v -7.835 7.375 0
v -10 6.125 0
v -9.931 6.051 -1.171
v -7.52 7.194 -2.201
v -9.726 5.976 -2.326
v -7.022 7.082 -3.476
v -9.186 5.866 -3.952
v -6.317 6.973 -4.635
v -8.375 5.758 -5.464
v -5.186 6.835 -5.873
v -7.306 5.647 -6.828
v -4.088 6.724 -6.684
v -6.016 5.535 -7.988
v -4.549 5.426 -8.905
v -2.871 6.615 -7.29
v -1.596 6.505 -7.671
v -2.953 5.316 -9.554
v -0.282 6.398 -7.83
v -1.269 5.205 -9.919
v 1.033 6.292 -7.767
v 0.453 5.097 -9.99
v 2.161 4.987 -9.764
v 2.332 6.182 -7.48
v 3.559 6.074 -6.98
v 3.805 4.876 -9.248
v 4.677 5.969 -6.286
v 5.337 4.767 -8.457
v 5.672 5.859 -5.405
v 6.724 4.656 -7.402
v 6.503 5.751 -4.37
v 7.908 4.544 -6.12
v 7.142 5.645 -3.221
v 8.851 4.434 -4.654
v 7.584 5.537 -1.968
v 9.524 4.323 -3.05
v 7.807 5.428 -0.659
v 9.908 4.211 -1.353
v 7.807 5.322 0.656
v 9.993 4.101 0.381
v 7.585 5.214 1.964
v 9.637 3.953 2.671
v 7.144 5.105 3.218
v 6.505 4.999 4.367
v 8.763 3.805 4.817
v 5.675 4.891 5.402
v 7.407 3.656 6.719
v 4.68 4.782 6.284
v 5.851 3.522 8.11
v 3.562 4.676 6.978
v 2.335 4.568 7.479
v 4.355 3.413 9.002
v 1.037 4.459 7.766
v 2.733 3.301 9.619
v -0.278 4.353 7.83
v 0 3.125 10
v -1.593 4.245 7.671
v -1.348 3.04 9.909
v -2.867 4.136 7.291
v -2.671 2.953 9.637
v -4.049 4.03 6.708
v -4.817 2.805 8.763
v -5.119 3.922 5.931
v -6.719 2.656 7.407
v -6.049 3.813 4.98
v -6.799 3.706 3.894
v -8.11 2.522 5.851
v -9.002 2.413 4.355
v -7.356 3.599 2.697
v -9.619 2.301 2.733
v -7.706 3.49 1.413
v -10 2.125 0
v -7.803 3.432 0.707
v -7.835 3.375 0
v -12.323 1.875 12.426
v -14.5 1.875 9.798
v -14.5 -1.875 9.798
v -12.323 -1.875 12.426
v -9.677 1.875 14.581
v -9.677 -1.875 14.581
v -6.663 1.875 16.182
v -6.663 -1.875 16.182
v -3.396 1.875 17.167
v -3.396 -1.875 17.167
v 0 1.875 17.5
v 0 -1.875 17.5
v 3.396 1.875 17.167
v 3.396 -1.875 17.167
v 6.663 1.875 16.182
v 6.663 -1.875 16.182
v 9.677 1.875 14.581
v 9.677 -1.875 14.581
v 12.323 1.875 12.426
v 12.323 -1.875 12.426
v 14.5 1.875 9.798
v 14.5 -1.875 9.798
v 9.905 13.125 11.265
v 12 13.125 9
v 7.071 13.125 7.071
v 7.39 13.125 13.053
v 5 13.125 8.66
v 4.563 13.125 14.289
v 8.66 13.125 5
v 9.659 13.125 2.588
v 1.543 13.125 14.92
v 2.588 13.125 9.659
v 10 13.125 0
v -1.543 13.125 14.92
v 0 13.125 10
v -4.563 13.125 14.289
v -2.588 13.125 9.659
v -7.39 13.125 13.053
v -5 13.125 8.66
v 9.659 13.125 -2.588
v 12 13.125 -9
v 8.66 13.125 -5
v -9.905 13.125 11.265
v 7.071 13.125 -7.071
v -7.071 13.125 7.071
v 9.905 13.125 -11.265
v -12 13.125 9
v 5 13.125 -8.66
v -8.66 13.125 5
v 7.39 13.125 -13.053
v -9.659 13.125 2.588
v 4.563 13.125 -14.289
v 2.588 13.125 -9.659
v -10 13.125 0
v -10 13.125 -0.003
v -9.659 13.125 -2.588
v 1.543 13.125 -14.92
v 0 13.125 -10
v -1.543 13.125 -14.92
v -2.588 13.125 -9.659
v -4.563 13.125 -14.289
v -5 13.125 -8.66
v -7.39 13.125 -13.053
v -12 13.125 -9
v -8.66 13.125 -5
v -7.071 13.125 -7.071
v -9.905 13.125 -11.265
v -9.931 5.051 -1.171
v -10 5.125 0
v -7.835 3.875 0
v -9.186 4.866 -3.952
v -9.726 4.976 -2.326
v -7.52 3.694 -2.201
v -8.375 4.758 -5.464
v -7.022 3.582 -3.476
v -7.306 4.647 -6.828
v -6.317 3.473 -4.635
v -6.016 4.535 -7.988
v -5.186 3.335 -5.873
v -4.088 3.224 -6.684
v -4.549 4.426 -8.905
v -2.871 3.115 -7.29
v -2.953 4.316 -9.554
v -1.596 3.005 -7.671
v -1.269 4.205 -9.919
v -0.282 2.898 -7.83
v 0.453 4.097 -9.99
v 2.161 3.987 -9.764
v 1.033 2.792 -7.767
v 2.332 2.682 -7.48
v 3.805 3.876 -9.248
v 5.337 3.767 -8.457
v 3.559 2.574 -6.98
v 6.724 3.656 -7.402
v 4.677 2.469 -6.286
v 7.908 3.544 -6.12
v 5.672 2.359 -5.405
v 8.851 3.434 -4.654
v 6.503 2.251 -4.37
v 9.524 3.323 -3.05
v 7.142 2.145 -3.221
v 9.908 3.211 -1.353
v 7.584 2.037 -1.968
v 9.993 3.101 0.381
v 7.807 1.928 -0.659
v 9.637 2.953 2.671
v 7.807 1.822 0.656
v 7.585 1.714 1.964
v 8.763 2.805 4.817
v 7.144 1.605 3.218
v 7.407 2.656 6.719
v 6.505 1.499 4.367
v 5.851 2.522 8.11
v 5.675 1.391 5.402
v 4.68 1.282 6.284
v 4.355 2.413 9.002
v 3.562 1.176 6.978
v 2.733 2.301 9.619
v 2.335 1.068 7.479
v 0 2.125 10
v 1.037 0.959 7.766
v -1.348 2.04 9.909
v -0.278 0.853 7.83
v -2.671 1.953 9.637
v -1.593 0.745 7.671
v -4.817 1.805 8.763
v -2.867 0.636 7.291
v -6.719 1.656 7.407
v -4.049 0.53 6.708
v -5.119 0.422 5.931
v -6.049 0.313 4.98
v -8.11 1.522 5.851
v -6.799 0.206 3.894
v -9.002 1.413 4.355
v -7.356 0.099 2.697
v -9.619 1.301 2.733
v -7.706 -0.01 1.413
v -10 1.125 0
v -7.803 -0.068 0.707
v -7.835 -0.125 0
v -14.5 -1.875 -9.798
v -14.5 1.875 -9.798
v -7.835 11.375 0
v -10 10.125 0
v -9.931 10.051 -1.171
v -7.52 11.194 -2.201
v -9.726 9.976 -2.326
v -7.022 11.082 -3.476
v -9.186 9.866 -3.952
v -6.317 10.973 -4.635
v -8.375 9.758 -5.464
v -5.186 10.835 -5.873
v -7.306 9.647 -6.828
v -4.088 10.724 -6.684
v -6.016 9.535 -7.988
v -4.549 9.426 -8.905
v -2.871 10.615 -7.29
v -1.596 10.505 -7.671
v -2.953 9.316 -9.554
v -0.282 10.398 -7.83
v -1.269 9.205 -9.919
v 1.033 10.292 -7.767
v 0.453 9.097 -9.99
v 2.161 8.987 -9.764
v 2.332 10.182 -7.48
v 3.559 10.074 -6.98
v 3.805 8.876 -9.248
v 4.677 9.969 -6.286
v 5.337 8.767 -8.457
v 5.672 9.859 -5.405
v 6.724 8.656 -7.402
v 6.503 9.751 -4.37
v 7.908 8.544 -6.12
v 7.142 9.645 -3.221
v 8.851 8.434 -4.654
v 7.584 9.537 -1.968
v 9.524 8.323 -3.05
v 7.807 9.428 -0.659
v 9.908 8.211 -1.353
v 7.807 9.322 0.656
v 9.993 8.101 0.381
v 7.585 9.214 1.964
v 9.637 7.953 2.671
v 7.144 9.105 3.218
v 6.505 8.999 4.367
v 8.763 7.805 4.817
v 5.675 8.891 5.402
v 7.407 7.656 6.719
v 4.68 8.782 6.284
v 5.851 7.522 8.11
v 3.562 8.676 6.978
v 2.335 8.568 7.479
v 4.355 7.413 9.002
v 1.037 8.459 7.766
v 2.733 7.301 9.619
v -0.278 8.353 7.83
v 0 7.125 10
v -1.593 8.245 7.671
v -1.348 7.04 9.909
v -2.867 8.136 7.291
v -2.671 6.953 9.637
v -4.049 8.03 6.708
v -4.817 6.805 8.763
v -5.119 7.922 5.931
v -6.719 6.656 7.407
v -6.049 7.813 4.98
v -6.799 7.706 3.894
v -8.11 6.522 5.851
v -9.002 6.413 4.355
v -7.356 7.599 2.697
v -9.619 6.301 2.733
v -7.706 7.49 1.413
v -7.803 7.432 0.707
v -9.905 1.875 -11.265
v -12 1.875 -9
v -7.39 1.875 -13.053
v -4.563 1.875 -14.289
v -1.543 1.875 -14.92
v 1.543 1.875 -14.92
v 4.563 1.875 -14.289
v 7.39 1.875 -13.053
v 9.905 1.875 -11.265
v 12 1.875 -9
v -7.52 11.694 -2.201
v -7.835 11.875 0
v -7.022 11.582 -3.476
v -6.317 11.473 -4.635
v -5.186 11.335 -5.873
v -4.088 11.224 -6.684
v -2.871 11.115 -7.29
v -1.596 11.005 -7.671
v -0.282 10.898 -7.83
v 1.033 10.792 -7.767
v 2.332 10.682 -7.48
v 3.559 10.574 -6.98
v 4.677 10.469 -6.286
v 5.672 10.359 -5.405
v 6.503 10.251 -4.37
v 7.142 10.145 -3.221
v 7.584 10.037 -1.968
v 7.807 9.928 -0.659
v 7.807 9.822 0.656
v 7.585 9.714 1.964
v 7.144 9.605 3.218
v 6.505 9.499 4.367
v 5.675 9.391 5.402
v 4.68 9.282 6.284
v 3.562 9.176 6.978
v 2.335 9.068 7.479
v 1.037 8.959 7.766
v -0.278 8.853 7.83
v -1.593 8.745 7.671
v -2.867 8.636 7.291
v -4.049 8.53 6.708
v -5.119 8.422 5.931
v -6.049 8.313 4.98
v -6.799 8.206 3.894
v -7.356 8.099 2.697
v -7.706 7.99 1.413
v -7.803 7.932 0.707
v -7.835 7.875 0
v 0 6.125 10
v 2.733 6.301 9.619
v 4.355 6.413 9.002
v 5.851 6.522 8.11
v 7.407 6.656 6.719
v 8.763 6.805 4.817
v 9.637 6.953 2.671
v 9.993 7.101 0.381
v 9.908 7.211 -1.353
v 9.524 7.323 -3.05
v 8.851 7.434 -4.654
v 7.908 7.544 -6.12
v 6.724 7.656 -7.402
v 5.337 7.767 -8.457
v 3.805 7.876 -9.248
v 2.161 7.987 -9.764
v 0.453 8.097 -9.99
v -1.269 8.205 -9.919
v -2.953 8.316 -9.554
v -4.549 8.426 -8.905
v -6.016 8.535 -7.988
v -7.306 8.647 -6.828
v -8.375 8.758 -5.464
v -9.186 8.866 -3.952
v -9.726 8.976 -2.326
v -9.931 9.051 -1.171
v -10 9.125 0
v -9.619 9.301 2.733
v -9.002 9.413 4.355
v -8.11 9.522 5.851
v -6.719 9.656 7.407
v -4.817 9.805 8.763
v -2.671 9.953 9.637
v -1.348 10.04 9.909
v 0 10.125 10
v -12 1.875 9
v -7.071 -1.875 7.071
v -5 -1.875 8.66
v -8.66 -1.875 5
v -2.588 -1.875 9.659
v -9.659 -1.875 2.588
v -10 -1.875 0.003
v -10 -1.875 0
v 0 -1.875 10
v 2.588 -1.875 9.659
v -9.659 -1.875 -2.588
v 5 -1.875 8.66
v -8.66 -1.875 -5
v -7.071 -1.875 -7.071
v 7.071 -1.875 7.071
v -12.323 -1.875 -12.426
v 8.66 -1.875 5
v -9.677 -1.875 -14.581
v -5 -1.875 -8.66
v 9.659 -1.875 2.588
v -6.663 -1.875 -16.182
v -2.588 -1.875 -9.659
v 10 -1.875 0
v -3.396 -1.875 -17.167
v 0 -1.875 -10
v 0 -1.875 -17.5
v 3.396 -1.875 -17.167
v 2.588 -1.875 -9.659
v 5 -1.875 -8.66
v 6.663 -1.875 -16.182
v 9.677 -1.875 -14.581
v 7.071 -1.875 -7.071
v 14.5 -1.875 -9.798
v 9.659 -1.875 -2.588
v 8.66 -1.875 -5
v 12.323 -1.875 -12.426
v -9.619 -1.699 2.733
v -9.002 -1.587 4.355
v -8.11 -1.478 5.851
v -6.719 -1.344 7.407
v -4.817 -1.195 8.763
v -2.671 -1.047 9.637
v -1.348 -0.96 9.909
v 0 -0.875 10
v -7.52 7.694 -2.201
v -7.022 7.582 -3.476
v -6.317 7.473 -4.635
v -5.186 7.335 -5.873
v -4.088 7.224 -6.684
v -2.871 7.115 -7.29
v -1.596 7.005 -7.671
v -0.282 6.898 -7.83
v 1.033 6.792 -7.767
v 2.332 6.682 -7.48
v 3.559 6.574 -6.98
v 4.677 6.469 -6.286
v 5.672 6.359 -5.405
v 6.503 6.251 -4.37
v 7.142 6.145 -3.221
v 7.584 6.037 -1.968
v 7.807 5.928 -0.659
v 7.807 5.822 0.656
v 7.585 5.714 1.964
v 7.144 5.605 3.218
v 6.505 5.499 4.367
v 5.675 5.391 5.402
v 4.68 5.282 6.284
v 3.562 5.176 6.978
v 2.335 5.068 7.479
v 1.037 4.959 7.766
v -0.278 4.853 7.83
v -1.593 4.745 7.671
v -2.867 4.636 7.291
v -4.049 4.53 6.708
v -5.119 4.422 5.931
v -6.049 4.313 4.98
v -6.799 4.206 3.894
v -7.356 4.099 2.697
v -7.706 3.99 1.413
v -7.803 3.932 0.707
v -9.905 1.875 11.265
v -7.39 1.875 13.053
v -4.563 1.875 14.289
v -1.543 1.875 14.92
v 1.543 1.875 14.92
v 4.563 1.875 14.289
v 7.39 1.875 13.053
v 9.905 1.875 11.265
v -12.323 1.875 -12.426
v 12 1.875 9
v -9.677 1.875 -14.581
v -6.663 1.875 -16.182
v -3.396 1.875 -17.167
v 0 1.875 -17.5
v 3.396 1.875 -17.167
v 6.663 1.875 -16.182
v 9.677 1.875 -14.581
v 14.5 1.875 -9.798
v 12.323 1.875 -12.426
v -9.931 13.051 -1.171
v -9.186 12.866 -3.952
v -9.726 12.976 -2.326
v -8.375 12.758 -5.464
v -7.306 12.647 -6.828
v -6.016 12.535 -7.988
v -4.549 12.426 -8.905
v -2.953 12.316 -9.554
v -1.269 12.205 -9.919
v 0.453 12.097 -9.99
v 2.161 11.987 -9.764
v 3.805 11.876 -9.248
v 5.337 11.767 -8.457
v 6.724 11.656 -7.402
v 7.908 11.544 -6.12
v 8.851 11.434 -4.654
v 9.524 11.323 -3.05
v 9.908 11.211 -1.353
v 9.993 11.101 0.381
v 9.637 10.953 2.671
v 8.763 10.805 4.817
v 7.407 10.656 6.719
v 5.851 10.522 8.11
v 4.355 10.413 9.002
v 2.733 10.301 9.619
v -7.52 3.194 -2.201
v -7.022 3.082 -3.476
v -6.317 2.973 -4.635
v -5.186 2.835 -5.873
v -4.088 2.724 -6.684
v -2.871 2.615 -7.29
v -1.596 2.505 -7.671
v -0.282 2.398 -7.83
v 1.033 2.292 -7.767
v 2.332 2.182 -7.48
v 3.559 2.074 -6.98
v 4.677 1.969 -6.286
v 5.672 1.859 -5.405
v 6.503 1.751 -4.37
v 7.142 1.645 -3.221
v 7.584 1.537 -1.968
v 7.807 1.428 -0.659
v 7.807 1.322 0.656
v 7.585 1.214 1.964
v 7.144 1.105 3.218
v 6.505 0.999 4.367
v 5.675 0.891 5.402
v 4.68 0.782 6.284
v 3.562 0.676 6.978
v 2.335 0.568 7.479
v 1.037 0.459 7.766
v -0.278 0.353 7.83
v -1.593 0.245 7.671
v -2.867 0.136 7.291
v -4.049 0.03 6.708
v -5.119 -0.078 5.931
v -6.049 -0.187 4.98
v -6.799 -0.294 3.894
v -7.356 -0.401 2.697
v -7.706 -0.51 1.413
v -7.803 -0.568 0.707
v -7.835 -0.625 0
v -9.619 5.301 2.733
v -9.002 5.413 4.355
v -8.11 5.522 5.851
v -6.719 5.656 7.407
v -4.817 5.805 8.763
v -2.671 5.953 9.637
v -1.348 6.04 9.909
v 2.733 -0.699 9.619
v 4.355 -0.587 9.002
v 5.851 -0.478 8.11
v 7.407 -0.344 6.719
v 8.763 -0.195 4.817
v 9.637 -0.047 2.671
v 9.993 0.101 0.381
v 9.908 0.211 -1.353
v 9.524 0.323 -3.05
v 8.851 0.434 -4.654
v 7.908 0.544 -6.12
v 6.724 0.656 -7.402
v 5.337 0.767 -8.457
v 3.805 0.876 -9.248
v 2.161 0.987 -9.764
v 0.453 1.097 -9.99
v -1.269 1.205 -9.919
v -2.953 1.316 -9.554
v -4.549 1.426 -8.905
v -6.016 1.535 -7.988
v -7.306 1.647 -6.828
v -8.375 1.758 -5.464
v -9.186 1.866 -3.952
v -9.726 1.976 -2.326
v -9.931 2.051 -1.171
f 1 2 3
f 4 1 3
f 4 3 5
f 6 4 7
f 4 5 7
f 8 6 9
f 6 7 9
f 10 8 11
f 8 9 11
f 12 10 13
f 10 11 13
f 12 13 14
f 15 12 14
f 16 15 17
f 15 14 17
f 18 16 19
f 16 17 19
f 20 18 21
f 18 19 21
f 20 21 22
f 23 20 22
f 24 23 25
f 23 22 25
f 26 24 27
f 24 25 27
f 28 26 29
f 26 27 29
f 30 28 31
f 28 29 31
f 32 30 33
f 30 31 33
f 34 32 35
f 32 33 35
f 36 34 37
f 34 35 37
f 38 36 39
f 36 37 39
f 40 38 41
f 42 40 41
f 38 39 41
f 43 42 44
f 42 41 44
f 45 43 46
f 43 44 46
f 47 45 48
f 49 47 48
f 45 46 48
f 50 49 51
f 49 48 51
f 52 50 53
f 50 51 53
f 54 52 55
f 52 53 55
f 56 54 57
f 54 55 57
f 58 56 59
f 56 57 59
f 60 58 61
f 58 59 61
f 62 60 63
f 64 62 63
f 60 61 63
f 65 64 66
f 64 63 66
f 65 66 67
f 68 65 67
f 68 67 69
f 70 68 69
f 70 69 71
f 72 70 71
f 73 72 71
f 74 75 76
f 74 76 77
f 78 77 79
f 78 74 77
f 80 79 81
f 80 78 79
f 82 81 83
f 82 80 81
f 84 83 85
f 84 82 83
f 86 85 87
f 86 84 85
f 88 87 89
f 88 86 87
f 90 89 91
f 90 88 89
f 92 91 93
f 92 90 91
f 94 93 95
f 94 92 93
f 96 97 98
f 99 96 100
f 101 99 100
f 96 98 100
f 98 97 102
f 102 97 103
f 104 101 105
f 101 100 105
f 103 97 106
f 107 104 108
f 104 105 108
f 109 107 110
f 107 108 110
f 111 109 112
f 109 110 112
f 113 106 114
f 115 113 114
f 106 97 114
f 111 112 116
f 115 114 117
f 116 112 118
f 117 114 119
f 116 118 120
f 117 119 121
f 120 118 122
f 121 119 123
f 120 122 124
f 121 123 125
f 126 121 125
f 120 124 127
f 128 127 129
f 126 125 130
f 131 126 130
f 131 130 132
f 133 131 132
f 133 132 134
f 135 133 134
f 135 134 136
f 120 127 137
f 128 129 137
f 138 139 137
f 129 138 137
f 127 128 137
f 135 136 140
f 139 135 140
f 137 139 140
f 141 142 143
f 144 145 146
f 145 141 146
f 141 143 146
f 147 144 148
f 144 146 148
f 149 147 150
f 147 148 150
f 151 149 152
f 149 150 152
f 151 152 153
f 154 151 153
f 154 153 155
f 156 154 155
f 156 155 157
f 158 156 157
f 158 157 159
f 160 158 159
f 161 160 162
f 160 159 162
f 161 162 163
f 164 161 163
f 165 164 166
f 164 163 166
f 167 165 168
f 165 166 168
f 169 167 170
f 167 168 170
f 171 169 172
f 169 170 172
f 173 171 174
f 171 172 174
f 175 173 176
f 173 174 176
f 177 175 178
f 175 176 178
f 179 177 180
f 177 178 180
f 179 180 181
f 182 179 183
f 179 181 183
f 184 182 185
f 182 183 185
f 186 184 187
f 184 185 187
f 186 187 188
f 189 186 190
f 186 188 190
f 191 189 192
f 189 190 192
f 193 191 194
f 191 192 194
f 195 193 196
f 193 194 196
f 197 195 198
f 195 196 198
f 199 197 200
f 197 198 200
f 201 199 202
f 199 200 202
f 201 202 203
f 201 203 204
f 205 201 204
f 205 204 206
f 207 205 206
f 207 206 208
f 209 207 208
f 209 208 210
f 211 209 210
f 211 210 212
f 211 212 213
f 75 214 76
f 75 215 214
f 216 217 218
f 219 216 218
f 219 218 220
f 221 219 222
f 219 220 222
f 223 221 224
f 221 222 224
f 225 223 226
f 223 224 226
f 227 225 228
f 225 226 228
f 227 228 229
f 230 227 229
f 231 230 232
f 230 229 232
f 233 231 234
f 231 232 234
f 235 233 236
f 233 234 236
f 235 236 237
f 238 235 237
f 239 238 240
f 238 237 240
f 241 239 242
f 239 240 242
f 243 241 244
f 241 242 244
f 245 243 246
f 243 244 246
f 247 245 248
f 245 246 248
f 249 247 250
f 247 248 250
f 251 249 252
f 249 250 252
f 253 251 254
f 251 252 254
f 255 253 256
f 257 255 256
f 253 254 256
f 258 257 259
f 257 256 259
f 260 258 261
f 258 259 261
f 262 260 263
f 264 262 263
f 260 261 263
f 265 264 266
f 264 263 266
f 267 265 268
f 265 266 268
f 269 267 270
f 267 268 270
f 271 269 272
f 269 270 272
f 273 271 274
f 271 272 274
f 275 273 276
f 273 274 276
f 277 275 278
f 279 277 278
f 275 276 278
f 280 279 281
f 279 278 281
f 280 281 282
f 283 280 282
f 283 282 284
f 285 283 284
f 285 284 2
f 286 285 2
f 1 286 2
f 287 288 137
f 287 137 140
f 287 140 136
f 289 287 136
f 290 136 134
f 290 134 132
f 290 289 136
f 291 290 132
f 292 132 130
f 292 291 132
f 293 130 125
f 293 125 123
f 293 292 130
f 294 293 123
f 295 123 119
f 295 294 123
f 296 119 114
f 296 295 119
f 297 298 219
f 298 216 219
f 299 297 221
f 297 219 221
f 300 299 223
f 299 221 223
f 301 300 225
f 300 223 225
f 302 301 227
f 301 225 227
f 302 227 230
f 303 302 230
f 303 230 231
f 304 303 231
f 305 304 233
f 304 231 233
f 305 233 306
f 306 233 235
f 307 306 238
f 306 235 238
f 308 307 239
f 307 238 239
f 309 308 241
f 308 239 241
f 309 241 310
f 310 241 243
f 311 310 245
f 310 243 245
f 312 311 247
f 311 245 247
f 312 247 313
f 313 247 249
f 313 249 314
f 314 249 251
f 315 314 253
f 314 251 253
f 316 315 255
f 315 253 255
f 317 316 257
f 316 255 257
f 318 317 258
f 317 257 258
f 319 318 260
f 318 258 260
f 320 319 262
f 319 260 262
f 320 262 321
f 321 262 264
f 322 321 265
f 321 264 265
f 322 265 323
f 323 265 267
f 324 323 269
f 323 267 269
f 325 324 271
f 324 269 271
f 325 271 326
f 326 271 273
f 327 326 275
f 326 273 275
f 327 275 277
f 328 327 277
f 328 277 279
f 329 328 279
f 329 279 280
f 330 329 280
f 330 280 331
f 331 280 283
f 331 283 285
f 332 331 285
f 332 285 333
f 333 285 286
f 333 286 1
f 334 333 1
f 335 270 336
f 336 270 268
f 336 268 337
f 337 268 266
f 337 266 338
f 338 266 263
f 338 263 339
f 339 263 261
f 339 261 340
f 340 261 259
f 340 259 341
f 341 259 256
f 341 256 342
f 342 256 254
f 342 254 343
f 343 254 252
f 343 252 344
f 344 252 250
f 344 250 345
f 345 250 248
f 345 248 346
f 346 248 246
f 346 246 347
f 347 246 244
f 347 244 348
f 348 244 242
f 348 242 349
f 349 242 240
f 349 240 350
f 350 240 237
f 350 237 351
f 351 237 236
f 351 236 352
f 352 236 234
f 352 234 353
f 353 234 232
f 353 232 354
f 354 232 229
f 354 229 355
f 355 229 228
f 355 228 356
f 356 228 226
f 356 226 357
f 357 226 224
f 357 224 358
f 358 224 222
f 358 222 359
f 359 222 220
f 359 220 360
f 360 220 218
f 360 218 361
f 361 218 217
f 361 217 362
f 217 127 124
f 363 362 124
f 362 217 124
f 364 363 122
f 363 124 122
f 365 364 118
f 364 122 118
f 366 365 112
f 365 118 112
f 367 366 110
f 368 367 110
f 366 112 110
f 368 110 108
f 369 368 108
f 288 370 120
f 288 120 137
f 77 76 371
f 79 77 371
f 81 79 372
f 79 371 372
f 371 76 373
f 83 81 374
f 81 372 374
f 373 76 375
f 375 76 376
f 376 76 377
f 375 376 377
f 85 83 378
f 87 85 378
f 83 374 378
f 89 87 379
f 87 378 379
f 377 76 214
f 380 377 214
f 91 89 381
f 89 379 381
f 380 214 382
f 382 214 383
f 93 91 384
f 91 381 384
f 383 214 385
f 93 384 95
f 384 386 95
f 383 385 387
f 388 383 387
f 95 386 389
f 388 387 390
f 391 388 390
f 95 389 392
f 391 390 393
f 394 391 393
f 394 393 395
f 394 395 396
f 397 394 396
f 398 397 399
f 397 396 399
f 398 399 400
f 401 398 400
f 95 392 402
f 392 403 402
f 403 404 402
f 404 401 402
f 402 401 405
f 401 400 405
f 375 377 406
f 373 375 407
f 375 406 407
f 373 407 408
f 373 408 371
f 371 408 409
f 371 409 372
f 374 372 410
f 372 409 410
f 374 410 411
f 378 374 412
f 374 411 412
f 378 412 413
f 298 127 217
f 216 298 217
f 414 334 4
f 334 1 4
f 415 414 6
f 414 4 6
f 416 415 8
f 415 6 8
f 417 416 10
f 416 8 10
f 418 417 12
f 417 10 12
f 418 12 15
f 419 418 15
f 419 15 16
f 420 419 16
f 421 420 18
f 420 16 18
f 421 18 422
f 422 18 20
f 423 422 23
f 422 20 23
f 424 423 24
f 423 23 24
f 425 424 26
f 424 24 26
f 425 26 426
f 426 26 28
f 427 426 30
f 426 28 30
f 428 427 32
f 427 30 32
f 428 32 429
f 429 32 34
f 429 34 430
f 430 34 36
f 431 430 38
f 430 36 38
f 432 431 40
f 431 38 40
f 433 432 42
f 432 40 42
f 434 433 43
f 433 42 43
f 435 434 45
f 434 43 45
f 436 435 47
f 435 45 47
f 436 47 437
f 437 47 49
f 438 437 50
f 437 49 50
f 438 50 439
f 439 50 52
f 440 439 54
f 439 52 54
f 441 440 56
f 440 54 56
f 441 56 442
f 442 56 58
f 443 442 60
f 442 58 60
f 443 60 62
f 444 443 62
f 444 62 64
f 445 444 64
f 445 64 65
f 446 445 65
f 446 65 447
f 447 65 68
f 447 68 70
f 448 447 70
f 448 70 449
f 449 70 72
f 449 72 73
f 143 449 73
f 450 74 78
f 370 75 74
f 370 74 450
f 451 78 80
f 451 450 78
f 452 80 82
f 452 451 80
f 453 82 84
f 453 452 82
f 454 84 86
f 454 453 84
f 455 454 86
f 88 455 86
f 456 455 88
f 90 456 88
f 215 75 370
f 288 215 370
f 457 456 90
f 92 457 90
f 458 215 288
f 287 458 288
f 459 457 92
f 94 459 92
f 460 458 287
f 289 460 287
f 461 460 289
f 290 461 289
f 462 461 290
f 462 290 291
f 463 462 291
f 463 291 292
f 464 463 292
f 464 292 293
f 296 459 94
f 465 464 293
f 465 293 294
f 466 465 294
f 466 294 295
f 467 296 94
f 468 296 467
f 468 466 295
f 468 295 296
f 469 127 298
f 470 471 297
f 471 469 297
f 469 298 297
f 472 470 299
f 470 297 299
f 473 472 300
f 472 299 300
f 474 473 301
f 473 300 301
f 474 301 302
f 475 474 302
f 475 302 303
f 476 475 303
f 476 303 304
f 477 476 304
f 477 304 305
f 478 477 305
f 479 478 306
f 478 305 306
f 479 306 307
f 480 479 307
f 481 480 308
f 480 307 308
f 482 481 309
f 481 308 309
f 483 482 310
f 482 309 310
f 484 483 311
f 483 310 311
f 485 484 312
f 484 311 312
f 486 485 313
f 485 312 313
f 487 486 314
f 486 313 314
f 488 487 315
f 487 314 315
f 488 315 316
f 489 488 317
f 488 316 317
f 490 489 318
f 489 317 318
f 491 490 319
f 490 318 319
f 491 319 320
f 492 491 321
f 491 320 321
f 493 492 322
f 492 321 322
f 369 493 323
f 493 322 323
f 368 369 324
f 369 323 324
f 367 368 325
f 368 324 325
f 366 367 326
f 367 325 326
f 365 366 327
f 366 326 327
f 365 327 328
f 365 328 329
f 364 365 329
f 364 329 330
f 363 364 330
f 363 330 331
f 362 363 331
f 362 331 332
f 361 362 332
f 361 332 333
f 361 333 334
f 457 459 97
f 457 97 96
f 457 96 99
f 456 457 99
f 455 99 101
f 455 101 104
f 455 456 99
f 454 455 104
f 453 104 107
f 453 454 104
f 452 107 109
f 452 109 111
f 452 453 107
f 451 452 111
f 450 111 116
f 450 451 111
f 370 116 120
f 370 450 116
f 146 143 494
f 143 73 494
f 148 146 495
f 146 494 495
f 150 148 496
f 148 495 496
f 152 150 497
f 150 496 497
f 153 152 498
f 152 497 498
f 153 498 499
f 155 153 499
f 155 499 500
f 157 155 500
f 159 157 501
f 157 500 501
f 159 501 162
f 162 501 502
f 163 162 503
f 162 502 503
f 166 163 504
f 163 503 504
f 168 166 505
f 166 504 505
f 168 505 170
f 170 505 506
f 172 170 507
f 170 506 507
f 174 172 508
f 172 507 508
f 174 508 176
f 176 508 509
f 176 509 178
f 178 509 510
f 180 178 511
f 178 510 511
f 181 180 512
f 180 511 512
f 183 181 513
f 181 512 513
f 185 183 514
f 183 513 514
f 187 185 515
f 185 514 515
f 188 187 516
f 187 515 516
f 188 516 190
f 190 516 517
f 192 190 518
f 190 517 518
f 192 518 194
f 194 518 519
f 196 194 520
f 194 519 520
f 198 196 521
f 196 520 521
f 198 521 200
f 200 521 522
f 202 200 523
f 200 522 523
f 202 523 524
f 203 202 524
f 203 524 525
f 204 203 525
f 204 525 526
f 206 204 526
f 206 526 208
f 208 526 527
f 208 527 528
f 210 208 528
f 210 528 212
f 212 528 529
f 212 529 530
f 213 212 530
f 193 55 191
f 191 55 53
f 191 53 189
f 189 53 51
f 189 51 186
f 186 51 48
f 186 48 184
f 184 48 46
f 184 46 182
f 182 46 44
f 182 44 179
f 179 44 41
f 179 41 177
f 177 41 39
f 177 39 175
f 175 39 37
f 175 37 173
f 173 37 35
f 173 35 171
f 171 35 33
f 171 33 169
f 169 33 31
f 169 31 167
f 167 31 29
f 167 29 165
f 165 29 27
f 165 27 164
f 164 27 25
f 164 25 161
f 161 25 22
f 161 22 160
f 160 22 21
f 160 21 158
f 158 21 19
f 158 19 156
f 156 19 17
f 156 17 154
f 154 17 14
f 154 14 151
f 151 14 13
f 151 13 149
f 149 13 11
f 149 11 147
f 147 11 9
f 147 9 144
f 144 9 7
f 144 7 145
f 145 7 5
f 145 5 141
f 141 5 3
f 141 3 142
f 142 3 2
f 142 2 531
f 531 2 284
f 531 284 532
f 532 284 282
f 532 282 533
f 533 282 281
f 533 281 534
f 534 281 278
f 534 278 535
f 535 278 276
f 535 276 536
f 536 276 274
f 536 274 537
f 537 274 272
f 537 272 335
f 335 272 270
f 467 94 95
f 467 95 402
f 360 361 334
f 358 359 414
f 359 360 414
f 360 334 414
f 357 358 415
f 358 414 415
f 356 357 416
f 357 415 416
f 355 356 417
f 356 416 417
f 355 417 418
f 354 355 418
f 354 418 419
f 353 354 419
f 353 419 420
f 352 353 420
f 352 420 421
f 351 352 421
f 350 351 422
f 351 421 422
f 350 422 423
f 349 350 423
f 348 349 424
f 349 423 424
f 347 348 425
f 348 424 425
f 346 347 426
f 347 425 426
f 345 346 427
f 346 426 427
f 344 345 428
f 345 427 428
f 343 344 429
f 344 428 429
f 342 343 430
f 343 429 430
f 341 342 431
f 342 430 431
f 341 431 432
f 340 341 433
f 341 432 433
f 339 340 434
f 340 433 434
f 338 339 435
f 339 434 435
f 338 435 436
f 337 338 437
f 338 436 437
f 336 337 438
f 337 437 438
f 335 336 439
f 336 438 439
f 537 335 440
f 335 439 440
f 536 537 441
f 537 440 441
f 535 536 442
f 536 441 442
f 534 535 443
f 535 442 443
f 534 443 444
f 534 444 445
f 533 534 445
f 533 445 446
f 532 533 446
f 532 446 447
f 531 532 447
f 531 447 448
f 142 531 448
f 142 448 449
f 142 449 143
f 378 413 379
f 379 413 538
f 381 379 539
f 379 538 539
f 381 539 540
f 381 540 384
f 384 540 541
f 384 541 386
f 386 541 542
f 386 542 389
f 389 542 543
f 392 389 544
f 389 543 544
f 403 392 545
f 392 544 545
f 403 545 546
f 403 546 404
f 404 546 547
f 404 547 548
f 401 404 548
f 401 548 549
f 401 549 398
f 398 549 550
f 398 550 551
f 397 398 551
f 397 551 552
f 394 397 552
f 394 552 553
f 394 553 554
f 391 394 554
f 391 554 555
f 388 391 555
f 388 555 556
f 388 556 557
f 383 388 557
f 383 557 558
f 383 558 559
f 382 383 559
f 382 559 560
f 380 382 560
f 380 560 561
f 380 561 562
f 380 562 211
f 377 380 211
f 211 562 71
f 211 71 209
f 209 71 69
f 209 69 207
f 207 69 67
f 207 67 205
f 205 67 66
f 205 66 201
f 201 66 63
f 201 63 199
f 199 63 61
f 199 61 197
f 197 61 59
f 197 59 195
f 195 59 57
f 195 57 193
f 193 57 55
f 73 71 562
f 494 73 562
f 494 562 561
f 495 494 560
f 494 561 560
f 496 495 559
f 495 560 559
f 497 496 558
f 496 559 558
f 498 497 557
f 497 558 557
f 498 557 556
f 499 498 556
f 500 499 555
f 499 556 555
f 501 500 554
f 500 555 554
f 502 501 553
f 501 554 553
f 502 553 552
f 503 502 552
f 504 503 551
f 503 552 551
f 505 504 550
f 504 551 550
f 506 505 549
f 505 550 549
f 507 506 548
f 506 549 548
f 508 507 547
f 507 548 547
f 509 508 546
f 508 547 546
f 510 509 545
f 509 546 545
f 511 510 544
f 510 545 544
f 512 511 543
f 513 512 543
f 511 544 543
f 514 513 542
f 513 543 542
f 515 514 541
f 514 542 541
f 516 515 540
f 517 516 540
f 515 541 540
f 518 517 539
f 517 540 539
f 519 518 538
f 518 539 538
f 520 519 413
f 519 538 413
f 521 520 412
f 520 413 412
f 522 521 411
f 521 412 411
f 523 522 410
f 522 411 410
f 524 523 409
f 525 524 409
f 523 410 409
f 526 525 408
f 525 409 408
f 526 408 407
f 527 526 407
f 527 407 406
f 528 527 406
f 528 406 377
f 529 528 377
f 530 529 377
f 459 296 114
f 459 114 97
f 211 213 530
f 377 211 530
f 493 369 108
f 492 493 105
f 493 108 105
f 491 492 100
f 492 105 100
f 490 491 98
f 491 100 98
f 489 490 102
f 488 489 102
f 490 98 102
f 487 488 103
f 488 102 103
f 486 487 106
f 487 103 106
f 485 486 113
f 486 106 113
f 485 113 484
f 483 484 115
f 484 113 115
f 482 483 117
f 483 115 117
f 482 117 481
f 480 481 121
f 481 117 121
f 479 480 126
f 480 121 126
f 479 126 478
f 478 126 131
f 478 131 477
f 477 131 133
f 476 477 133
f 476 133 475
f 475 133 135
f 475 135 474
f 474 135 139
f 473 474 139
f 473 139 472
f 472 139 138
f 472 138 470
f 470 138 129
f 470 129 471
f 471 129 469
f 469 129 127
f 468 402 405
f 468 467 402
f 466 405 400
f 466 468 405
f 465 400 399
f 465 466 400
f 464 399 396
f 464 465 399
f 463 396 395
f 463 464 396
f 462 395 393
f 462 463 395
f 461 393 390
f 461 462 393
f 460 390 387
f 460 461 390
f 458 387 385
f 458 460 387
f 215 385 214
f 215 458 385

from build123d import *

# Parameters (mm, degrees)
BOSS_EXTRUDE1_DEPTH = 1.875
BOSS_EXTRUDE2_DEPTH = 11.25
SKETCH4_R           = 10
CUT_EXTRUDE1_DEPTH  = 28.230497608
THREAD1_PITCH       = 4


with BuildPart() as part:
    # Sketch1 → Boss-Extrude1 (new, symmetric)
    with BuildSketch(Plane(origin=(0, 0, 0), x_dir=(1, 0, 0), z_dir=(0, 1, 0))):
        with BuildLine():
            Line((-14.5, 9.797958971), (-14.5, -9.797958971))
            ThreePointArc((-14.5, -9.797958971), (0, -17.5), (14.5, -9.797958971))
            Line((14.5, -9.797958971), (14.5, 9.797958971))
            ThreePointArc((14.5, 9.797958971), (0, 17.5), (-14.5, 9.797958971))
        make_face()
    extrude(amount=BOSS_EXTRUDE1_DEPTH, both=True)

    # Sketch2 → Boss-Extrude2 (add)
    with BuildSketch(Plane(origin=(0, 1.875, 0), x_dir=(1, 0, 0), z_dir=(0, 1, 0))):
        with BuildLine():
            Line((12, 9), (12, -9))
            ThreePointArc((12, -9), (0, -15), (-12, -9))
            Line((-12, -9), (-12, 9))
            ThreePointArc((-12, 9), (0, 15), (12, 9))
        make_face()
    extrude(amount=BOSS_EXTRUDE2_DEPTH)

    # Sketch4 → Cut-Extrude1 (cut, through all)
    with BuildSketch(Plane(origin=(0, 13.125, 0), x_dir=(1, 0, 0), z_dir=(0, 1, 0))):
        with Locations(Location((0, 0, 0), (0, 0, 270))):
            Circle(SKETCH4_R)
    extrude(amount=-CUT_EXTRUDE1_DEPTH, mode=Mode.SUBTRACT)

    # Thread1: arcs per turn and ends read off the stored shape
    # Thread1: the profile of Thread Profile1 profile screwed along a right-hand helix through 3 turns, 12 arcs to a turn; built about Z, then put on its axis
    thread1_z = Axis((0, 0, 0), (0, 0, 1))
    thread1_corners = [(10.0003, 0, -0.000173205), (7.8349365, 0, 1.249999995), (7.8349365, 0, 1.749999995), (10.0003, 0, 3.000173194)]
    with BuildLine(mode=Mode.PRIVATE) as thread1_profile:
        Line(thread1_corners[0], thread1_corners[1])
        Line(thread1_corners[1], thread1_corners[2])
        Line(thread1_corners[2], thread1_corners[3])
        Line(thread1_corners[3], thread1_corners[0])
    thread1_cap = Face(thread1_profile.wire())
    thread1_turn_angles = [0, 15, 30, 45, 60, 75, 90, 105, 120, 135, 150, 165, 180, 195, 210, 225, 240, 255, 270, 285, 300, 315, 330, 345, 360]
    thread1_turn_weights = [1, 0.9659258262890683, 1, 0.9659258262890683, 1, 0.9659258262890683, 1, 0.9659258262890683, 1, 0.9659258262890683, 1, 0.9659258262890683, 1, 0.9659258262890683, 1, 0.9659258262890683, 1, 0.9659258262890683, 1, 0.9659258262890683, 1, 0.9659258262890683, 1, 0.9659258262890683, 1]
    thread1_turn_rails = [Edge.make_bspline([Vector(p[0], p[1], 0).rotate(thread1_z, thread1_turn_angles[k]) / thread1_turn_weights[k] + Vector(0, 0, p[2] + THREAD1_PITCH * thread1_turn_angles[k] / 360) for k in range(25)], [0, 0, 0, 1, 1, 2, 2, 3, 3, 4, 4, 5, 5, 6, 6, 7, 7, 8, 8, 9, 9, 10, 10, 11, 11, 12, 12, 12], 2, thread1_turn_weights) for p in thread1_corners]
    thread1_turn_sides = [Face.make_surface_from_curves(thread1_turn_rails[p[0]], thread1_turn_rails[p[1]]) for p in [(0, 1), (1, 2), (2, 3), (3, 0)]]
    thread1 = Plane(origin=(0, 13.125, 0), x_dir=(-1, 0, 0), z_dir=(0, -1, 0)) * Solid(Shell([*[p.moved(Location((0, 0, THREAD1_PITCH * i))) for i in range(3) for p in thread1_turn_sides], thread1_cap, thread1_cap.rotate(thread1_z, 1080).moved(Location((0, 0, THREAD1_PITCH * 1080 / 360)))]))
    add(thread1)


solid = part.part
